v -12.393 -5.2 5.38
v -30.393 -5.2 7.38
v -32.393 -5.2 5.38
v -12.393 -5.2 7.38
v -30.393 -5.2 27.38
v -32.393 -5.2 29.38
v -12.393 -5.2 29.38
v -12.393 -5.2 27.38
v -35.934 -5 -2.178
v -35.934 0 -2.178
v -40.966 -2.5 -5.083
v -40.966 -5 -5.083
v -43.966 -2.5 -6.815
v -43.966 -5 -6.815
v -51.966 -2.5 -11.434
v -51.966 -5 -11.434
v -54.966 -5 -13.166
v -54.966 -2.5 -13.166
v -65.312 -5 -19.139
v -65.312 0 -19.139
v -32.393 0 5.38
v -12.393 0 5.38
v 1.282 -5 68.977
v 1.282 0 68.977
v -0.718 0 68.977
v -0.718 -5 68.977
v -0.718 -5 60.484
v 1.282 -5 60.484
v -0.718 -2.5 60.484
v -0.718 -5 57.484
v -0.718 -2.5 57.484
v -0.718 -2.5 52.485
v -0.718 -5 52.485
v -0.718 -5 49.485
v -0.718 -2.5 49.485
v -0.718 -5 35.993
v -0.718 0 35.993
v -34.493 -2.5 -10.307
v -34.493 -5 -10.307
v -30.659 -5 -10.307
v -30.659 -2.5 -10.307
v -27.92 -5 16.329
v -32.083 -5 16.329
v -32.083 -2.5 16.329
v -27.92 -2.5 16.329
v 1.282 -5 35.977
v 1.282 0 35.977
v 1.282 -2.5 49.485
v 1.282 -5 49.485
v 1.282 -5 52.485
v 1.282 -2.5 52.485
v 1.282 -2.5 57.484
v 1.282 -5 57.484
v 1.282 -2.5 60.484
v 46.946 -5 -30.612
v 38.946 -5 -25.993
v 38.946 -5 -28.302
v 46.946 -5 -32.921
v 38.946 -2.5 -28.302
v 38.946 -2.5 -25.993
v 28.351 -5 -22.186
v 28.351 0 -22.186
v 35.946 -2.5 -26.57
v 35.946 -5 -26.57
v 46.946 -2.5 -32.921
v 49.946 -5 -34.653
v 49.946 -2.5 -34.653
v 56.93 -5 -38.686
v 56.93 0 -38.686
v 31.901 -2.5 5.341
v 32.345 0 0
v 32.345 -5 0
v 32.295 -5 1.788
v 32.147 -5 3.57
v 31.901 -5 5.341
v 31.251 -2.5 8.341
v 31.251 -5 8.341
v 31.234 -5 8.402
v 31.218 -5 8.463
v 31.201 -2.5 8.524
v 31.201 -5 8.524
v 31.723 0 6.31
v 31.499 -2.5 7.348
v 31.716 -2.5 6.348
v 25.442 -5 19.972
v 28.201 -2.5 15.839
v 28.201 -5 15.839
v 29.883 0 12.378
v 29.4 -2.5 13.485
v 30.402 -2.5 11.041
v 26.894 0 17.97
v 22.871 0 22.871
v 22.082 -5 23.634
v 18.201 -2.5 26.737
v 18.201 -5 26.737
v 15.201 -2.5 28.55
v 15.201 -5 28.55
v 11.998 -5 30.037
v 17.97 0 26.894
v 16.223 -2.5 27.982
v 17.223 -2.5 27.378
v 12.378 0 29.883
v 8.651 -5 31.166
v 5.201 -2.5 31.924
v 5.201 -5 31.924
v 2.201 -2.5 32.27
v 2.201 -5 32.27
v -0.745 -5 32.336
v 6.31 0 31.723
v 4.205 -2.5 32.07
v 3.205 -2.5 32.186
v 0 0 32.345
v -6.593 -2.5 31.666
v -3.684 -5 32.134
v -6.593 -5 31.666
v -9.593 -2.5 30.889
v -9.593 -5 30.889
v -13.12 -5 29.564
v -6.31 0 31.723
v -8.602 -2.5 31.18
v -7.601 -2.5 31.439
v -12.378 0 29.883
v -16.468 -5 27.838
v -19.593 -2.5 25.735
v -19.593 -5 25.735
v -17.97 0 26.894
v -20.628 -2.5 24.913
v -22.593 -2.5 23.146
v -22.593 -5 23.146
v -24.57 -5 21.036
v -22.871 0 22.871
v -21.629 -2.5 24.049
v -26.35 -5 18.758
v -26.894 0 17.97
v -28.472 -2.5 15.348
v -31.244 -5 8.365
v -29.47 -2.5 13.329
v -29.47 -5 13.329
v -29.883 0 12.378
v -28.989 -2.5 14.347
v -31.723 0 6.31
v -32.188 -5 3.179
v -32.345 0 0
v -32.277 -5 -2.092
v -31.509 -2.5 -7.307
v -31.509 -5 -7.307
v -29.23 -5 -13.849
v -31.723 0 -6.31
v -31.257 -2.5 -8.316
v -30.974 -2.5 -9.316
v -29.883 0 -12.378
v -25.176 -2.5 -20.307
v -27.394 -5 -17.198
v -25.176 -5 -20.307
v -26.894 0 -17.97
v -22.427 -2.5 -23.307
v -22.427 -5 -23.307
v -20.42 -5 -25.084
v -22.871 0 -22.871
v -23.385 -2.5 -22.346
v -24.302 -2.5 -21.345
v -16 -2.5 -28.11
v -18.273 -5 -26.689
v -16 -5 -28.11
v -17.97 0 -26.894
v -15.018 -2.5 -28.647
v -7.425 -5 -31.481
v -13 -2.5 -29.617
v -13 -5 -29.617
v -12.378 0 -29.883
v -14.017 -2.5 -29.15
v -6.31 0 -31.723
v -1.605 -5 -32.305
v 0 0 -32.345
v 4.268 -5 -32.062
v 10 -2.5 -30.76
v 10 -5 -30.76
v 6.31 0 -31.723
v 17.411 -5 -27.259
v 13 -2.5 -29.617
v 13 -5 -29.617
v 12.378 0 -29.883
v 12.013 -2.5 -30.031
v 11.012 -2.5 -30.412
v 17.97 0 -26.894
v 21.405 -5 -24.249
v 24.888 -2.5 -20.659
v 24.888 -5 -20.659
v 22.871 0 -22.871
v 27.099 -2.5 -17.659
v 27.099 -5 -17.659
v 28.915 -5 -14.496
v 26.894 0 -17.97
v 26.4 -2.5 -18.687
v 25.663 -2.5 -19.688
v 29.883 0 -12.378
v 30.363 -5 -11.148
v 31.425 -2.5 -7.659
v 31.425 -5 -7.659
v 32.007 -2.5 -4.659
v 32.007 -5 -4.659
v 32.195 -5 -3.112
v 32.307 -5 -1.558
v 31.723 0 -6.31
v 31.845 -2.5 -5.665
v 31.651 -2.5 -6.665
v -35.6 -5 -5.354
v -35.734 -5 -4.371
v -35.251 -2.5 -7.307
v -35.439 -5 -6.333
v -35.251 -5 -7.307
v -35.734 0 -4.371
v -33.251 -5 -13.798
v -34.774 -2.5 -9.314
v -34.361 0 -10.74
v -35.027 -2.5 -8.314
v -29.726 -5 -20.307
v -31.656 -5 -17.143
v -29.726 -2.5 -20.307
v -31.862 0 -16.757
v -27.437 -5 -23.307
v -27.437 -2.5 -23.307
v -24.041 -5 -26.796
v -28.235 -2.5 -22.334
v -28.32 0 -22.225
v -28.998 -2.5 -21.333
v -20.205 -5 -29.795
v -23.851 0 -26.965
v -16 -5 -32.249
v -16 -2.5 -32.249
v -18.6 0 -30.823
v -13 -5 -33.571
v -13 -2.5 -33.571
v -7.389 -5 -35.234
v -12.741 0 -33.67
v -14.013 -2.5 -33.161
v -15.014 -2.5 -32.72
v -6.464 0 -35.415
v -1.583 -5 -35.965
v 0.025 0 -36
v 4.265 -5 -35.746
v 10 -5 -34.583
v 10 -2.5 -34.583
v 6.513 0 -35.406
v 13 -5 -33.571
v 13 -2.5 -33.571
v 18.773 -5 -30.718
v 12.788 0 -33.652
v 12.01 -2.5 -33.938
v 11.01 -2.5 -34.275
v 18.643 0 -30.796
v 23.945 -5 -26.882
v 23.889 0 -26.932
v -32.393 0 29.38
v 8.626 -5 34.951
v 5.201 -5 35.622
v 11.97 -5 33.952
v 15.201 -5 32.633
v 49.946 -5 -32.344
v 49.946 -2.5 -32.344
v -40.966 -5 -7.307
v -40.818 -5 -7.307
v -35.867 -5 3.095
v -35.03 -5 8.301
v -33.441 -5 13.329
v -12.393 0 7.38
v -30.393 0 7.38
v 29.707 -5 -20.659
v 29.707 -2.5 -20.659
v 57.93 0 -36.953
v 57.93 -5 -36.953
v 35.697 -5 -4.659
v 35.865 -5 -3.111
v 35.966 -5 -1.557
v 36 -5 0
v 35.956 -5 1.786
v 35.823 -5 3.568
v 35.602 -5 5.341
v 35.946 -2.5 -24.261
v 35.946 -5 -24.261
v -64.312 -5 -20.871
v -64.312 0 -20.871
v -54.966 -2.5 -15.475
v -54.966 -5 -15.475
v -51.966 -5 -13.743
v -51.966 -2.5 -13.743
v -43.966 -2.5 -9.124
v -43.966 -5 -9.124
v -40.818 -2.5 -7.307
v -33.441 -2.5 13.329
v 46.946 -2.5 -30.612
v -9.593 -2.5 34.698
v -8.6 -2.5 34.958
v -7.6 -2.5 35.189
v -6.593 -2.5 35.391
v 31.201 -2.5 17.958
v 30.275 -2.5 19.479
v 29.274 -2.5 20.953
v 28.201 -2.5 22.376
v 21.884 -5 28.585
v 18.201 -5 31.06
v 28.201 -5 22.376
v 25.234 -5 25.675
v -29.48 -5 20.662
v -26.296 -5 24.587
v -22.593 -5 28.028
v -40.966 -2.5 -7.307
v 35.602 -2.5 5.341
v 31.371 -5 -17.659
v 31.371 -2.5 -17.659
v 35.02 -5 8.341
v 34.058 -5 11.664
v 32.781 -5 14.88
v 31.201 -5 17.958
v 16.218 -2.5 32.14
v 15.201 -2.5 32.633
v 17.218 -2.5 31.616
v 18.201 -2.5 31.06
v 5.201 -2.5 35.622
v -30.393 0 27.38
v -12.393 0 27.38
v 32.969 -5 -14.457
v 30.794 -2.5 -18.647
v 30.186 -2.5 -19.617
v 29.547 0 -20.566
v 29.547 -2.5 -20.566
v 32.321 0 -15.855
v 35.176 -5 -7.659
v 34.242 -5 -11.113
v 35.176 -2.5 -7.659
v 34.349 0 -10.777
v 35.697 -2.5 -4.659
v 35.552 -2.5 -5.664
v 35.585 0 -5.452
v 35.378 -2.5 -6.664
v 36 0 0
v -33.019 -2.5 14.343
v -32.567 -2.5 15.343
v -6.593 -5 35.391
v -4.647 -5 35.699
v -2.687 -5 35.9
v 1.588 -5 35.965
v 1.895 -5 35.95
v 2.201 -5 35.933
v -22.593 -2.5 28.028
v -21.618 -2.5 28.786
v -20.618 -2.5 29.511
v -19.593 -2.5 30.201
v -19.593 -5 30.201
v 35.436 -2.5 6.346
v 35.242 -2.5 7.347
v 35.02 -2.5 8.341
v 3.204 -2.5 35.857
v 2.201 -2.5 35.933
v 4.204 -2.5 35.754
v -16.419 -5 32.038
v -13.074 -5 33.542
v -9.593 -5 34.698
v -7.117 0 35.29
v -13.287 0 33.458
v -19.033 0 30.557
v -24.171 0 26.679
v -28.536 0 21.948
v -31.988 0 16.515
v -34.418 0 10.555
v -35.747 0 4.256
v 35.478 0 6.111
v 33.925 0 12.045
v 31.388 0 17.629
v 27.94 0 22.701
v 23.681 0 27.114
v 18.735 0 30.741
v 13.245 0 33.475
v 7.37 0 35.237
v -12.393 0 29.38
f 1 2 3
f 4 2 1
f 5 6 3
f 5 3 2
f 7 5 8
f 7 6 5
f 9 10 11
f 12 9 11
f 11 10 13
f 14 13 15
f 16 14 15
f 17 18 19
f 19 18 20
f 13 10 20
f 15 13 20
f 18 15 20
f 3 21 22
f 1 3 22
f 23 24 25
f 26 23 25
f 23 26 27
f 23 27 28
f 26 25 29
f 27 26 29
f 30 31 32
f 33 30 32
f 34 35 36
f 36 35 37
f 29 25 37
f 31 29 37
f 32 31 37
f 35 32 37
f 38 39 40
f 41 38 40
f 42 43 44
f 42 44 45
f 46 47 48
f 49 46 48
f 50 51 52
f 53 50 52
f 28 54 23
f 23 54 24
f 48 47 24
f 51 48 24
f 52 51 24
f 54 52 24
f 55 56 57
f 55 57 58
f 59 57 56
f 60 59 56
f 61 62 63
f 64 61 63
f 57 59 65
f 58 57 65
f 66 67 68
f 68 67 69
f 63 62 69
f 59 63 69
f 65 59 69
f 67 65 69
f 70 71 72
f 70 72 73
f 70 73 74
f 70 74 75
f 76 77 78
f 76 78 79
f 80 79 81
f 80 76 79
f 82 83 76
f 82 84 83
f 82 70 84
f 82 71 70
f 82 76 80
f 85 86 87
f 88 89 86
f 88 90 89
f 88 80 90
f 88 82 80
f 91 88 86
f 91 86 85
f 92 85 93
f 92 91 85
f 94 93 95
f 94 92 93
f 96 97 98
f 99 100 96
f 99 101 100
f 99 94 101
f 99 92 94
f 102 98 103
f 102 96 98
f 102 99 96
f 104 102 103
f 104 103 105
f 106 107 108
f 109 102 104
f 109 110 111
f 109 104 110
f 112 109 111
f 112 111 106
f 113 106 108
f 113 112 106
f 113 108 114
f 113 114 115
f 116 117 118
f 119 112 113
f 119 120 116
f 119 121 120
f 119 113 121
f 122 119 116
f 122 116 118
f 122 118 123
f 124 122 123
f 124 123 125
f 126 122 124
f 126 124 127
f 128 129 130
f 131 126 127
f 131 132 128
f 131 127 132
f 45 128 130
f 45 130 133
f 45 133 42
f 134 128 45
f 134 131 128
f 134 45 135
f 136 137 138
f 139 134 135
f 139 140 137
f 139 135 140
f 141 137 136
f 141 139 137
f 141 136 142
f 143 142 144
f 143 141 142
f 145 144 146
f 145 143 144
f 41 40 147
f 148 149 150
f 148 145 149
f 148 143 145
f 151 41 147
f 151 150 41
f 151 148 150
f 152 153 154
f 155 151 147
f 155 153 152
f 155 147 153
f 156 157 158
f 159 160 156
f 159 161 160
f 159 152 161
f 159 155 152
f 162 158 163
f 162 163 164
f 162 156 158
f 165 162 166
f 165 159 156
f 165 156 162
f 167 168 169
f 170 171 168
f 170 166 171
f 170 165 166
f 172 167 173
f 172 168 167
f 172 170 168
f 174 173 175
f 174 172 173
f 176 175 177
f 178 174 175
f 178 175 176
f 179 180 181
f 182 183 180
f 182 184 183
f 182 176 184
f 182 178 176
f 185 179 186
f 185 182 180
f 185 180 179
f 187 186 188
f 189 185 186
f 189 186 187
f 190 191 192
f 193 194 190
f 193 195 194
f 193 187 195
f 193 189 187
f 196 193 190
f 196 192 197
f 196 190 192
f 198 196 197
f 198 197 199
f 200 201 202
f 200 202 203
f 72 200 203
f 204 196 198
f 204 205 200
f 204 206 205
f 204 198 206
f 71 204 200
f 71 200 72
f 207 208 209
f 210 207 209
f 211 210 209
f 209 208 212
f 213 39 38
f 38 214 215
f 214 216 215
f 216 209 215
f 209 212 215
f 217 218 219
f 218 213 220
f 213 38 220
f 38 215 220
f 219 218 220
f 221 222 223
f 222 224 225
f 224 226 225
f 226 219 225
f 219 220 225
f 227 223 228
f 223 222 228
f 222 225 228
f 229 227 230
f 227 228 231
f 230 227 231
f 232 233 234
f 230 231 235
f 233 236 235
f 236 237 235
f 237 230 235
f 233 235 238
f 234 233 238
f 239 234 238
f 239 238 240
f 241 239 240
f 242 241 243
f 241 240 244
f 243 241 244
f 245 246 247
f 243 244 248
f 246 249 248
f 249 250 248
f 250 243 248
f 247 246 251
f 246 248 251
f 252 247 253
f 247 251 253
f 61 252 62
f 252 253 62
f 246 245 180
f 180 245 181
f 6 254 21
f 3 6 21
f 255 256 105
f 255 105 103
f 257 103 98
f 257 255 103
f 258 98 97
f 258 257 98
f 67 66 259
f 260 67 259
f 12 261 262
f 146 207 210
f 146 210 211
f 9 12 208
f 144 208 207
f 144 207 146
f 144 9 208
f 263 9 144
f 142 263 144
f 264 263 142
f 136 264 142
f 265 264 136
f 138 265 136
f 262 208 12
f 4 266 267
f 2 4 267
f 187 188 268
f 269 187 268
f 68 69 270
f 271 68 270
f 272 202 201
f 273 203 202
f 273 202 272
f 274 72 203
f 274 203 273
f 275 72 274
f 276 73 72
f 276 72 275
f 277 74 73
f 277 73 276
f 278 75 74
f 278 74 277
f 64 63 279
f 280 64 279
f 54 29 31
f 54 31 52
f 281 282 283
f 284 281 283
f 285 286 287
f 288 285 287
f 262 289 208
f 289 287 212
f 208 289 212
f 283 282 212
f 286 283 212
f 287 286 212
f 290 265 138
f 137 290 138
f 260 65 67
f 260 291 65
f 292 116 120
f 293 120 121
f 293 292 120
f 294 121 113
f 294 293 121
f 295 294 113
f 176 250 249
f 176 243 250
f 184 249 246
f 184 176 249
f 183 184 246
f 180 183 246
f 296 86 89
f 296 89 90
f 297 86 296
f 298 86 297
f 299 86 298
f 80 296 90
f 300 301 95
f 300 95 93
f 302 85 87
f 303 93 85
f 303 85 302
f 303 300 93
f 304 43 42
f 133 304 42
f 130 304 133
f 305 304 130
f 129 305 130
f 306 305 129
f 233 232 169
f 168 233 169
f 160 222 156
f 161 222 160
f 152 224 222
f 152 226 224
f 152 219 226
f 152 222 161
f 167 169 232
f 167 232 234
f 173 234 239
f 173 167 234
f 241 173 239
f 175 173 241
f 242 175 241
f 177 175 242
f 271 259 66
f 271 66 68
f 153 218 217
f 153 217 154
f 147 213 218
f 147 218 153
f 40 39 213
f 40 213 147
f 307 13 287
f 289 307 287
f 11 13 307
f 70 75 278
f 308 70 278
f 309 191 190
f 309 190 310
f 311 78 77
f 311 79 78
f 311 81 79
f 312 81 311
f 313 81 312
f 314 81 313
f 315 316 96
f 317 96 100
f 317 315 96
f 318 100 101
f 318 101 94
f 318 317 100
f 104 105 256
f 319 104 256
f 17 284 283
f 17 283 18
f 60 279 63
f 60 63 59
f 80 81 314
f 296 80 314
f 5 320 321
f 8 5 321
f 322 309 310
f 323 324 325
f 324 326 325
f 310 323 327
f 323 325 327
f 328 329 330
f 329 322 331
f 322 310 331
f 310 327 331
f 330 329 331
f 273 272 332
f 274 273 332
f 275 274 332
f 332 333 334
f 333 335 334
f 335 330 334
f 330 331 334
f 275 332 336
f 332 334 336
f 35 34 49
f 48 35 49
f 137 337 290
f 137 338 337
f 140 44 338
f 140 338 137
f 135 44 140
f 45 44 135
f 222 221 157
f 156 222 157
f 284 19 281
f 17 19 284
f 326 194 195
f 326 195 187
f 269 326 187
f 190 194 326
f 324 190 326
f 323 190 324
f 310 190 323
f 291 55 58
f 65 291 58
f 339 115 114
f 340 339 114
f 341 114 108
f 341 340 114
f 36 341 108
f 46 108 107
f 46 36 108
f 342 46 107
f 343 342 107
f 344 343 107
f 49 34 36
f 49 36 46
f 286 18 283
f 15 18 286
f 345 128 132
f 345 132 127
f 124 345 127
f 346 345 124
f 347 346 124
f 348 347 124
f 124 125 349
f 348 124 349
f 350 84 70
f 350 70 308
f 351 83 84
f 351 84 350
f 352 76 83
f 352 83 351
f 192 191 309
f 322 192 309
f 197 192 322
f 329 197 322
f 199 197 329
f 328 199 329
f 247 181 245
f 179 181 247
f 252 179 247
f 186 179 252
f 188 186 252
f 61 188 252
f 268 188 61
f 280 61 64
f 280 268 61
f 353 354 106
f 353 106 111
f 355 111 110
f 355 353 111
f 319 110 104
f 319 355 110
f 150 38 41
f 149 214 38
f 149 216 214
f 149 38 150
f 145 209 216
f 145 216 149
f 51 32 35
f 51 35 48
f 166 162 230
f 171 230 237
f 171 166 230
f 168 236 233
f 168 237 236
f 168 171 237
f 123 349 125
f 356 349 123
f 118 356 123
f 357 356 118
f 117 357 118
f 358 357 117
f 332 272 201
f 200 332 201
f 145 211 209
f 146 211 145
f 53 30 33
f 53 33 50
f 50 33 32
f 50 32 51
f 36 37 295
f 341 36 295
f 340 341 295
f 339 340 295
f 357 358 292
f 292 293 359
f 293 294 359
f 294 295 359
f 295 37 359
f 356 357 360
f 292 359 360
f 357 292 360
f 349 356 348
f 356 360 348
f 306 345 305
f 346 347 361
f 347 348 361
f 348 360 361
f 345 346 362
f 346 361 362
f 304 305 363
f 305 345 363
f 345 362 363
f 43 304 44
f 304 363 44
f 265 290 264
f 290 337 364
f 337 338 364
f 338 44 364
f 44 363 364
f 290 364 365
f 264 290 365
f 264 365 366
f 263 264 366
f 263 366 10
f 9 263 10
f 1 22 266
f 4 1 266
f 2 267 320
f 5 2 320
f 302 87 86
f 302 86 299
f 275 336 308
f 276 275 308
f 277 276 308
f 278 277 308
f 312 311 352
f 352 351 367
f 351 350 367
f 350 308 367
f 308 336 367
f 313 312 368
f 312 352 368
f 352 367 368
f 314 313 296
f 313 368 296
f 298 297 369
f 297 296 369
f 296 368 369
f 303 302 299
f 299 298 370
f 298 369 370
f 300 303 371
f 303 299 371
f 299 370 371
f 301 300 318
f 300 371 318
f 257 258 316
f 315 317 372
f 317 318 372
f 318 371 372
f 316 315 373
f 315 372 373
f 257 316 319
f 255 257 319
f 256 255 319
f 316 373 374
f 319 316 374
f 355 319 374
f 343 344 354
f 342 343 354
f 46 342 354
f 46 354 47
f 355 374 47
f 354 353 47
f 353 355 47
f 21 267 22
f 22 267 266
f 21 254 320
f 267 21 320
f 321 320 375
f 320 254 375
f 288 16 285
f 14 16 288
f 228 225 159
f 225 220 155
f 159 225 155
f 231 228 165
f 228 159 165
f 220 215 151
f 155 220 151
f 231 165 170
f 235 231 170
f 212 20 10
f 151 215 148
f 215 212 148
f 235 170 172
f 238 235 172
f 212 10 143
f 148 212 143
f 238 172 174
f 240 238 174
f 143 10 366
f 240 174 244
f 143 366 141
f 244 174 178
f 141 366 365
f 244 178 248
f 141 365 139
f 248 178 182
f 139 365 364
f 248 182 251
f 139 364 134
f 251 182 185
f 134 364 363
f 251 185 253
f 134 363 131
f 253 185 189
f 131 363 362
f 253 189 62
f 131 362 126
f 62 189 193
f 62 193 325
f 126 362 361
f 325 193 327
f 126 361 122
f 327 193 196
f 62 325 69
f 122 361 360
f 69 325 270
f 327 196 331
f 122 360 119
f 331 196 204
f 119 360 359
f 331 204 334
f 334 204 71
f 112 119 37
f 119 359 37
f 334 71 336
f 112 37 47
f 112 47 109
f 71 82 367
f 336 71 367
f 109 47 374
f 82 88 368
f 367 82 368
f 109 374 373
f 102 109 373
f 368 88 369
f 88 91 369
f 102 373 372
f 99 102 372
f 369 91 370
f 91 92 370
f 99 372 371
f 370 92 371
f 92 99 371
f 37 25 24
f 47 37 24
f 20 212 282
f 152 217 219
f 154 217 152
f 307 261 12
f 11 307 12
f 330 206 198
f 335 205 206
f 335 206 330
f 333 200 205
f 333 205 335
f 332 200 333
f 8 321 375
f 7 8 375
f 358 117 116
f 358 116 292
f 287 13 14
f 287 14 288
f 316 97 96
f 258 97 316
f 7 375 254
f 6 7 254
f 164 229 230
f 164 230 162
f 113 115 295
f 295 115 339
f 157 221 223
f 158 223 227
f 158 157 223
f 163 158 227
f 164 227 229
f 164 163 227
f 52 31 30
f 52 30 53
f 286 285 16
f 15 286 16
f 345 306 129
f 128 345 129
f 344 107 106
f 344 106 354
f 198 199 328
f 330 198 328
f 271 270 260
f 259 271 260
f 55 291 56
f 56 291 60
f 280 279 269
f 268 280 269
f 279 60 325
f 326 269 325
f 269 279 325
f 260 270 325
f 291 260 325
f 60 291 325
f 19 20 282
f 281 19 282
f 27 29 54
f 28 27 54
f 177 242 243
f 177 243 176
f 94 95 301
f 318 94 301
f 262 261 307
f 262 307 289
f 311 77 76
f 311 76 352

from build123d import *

# Parameters (mm, degrees)
F0_W     = 2
F0_H     = 20
F1_DEPTH = 5.2
F3_R     = 32.3447121386
F4_DEPTH = 5
F5_W     = 13.572675172
F5_H     = 3
F5_W_2   = 3
F5_H_2   = 7.1146996021
F5_W_3   = 2.1339680368
F5_W_4   = 0.2662442029
F5_W_5   = 13.7997193004
F5_W_6   = 30
F5_H_3   = 13.0011811852
F5_H_4   = 30
F5_W_7   = 18.9105942249
F5_H_5   = 10
F5_W_8   = 8
F5_H_6   = 2.1246682657
F5_H_7   = 17.7334510805
F5_W_9   = 0.0894057751
F5_W_10  = 6.9841714074
F5_W_11  = 30.4511226714
F5_H_8   = 23.2589878142
F5_H_9   = 23.0766864568
F5_H_10  = 16.892408269
F5_W_12  = 17.7097696288
F5_W_13  = 22.2877347842
F5_H_11  = 23.447284475
F5_H_12  = 27.4531447118
F5_W_14  = 19.8099045083
F5_W_15  = 9.4498991966
F5_W_16  = 47.1669645049
F6_DEPTH = 2.5


with BuildPart() as f1:
    # F0 (on Front) → F1 (new body)
    with BuildSketch(Plane.XZ):
        Polygon((-32.3928073049, 29.3797243163), (-32.3928073049, 27.3797243163), (-30.3928073049, 27.3797243163), (-12.3928073049, 27.3797243163), (-12.3928073049, 29.3797243163), align=None)
        with Locations((-31.3928073049, 17.3797243163)):
            Rectangle(F0_W, F0_H)
        Polygon((-30.3928073049, 7.3797243163), (-32.3928073049, 7.3797243163), (-32.3928073049, 5.3797243163), (-12.3928073049, 5.3797243163), (-12.3928073049, 7.3797243163), align=None)
    extrude(amount=F1_DEPTH)


with BuildPart() as f4:
    # F3 (on face) → F4 (new body)
    with BuildSketch(Plane.XZ):
        with BuildLine():
            Line((-0.718275291, 68.9771758448), (-0.718275291, 35.9928337396))
            ThreePointArc((-0.718275291, 35.9928337396), (0.2818334687, 35.9988967872), (1.281724709, 35.9771758448))
            Line((1.281724709, 35.9771758448), (1.281724709, 68.9771758448))
            Line((1.281724709, 68.9771758448), (-0.718275291, 68.9771758448))
        make_face()
        with BuildLine():
            ThreePointArc((1.281724709, 35.9771758448), (0.2818334687, 35.9988967872), (-0.718275291, 35.9928337396))
            ThreePointArc((-0.718275291, 35.9928337396), (-26.4593304957, 24.4111415079), (-35.9340729634, -2.1777052736))
            ThreePointArc((-35.9340729634, -2.1777052736), (-35.8506255781, -3.2760716812), (-35.7336132594, -4.3713708863))
            ThreePointArc((-35.7336132594, -4.3713708863), (-9.6415771636, -34.6848668701), (28.3514265226, -22.185504595))
            ThreePointArc((28.3514265226, -22.185504595), (28.9605266738, -21.3842908411), (29.5469914366, -20.5663632431))
            ThreePointArc((29.5469914366, -20.5663632431), (34.3488842011, -10.7774836646), (36, 0))
            ThreePointArc((36, 0), (25.905038984, 24.9985790644), (1.281724709, 35.9771758448))
        make_face()
        Circle(F3_R, mode=Mode.SUBTRACT)
        with BuildLine():
            ThreePointArc((-35.7336132594, -4.3713708863), (-35.8506255781, -3.2760716812), (-35.9340729634, -2.1777052736))
            Line((-35.9340729634, -2.1777052736), (-65.3124515843, -19.1393200788))
            Line((-65.3124515843, -19.1393200788), (-64.3124515843, -20.8713708863))
            Line((-64.3124515843, -20.8713708863), (-35.7336132594, -4.3713708863))
        make_face()
        with BuildLine():
            Line((57.9302648475, -36.9534537874), (29.5469914366, -20.5663632431))
            ThreePointArc((29.5469914366, -20.5663632431), (28.9605266738, -21.3842908411), (28.3514265226, -22.185504595))
            Line((28.3514265226, -22.185504595), (56.9302648475, -38.685504595))
            Line((56.9302648475, -38.685504595), (57.9302648475, -36.9534537874))
        make_face()
    extrude(amount=F4_DEPTH)

    # F5 (on face) → F6 (cut)
    with BuildSketch(Plane.XZ.offset(5)):
        with Locations((-50.7524073439, 4.1931017637)):
            Rectangle(F5_W, F5_H)
        with Locations((-42.4660697579, 9.2504515648)):
            Rectangle(F5_W_2, F5_H_2)
        with Locations((-42.4660697579, 4.1931017637)):
            Rectangle(F5_W_2, F5_H)
        with Locations((-39.8990857395, 4.1931017637)):
            Rectangle(F5_W_3, F5_H)
        Polygon((-40.9660697579, 2.6931017637), (-43.9660697579, 2.6931017637), (-43.9660697579, -10.9778223559), (-40.9660697579, -10.9778223559), (-40.9660697579, -10.3068982363), (-41.2323139608, -10.3068982363), (-41.2323139608, -7.3068982363), (-40.9660697579, -7.3068982363), align=None)
        with Locations((-41.0991918594, -8.8068982363)):
            Rectangle(F5_W_4, F5_H)
        with Locations((-34.0662101077, -8.8068982363)):
            Rectangle(F5_W_5, F5_H)
        with Locations((-21.7747657001, -21.8068982363)):
            Rectangle(F5_W_6, F5_H)
        with Locations((-14.5, -34.2673957348)):
            Rectangle(F5_W_2, F5_H_3)
        with Locations((11.5, -25.582254529)):
            Rectangle(F5_W_2, F5_H_4)
        with Locations((26.4907963276, -19.1589427693)):
            Rectangle(F5_W_7, F5_H)
        with Locations((37.4460934401, -12.6589427693)):
            Rectangle(F5_W_2, F5_H_5)
        with Locations((37.4460934401, -19.1589427693)):
            Rectangle(F5_W_2, F5_H)
        with Locations((42.9460934401, -19.1589427693)):
            Rectangle(F5_W_8, F5_H)
        with Locations((37.4460934401, -6.5966086365)):
            Rectangle(F5_W_2, F5_H_6)
        Polygon((21.3408830383, -7.6589427693), (35.9460934401, -7.6589427693), (35.9460934401, -5.5342745036), (38.9460934401, -5.5342745036), (38.9460934401, -7.6589427693), (46.9460934401, -7.6589427693), (46.9460934401, -4.6589427693), (21.3408830383, -4.6589427693), align=None)
        with Locations((37.4460934401, -29.5256683096)):
            Rectangle(F5_W_2, F5_H_7)
        Polygon((46.9460934401, -7.6589427693), (46.9460934401, -17.6589427693), (47.0354992151, -17.6589427693), (47.0354992151, -20.6589427693), (46.9460934401, -20.6589427693), (46.9460934401, -41.1515384912), (49.9460934401, -41.1515384912), (49.9460934401, -7.6589427693), align=None)
        with Locations((46.9907963276, -19.1589427693)):
            Rectangle(F5_W_9, F5_H)
        with Locations((48.4460934401, -6.1589427693)):
            Rectangle(F5_W_2, F5_H)
        with Locations((53.4381791438, -6.1589427693)):
            Rectangle(F5_W_10, F5_H)
        with Locations((39.7508572787, 6.8410572307)):
            Rectangle(F5_W_11, F5_H)
        with Locations((-8.0932132453, 35.8674060553)):
            Rectangle(F5_W_2, F5_H_8)
        with Locations((3.7013028025, 37.945441626)):
            Rectangle(F5_W_2, F5_H_9)
        with Locations((-53.4660697579, -9.5130702171)):
            Rectangle(F5_W_2, F5_H_10)
        with Locations((-27.079188149, -68.7113851728)):
            Rectangle(F5_W_12, F5_H)
        with Locations((-2.4145045318, 58.9837848544)):
            Rectangle(F5_W_13, F5_H)
        Polygon((-19.5932132453, 38.1955653429), (-22.5932132453, 38.1955653429), (-22.5932132453, 0.1370755699), (-22.5932132453, -8.6032444029), (-19.5932132453, -8.6032444029), align=None)
        with Locations((16.7013028025, 29.8444582149)):
            Rectangle(F5_W_2, F5_H_11)
        with Locations((29.7013028025, 22.2506034889)):
            Rectangle(F5_W_2, F5_H_12)
        with Locations((2.0907674916, 50.9850047922)):
            Rectangle(F5_W_14, F5_H)
        with Locations((-32.0334173739, 14.8294658735)):
            Rectangle(F5_W_15, F5_H)
        with Locations((18.230658723, -57.7113851728)):
            Rectangle(F5_W_16, F5_H)
    extrude(amount=-F6_DEPTH, mode=Mode.SUBTRACT)


solid = Compound([f1.part, f4.part])
